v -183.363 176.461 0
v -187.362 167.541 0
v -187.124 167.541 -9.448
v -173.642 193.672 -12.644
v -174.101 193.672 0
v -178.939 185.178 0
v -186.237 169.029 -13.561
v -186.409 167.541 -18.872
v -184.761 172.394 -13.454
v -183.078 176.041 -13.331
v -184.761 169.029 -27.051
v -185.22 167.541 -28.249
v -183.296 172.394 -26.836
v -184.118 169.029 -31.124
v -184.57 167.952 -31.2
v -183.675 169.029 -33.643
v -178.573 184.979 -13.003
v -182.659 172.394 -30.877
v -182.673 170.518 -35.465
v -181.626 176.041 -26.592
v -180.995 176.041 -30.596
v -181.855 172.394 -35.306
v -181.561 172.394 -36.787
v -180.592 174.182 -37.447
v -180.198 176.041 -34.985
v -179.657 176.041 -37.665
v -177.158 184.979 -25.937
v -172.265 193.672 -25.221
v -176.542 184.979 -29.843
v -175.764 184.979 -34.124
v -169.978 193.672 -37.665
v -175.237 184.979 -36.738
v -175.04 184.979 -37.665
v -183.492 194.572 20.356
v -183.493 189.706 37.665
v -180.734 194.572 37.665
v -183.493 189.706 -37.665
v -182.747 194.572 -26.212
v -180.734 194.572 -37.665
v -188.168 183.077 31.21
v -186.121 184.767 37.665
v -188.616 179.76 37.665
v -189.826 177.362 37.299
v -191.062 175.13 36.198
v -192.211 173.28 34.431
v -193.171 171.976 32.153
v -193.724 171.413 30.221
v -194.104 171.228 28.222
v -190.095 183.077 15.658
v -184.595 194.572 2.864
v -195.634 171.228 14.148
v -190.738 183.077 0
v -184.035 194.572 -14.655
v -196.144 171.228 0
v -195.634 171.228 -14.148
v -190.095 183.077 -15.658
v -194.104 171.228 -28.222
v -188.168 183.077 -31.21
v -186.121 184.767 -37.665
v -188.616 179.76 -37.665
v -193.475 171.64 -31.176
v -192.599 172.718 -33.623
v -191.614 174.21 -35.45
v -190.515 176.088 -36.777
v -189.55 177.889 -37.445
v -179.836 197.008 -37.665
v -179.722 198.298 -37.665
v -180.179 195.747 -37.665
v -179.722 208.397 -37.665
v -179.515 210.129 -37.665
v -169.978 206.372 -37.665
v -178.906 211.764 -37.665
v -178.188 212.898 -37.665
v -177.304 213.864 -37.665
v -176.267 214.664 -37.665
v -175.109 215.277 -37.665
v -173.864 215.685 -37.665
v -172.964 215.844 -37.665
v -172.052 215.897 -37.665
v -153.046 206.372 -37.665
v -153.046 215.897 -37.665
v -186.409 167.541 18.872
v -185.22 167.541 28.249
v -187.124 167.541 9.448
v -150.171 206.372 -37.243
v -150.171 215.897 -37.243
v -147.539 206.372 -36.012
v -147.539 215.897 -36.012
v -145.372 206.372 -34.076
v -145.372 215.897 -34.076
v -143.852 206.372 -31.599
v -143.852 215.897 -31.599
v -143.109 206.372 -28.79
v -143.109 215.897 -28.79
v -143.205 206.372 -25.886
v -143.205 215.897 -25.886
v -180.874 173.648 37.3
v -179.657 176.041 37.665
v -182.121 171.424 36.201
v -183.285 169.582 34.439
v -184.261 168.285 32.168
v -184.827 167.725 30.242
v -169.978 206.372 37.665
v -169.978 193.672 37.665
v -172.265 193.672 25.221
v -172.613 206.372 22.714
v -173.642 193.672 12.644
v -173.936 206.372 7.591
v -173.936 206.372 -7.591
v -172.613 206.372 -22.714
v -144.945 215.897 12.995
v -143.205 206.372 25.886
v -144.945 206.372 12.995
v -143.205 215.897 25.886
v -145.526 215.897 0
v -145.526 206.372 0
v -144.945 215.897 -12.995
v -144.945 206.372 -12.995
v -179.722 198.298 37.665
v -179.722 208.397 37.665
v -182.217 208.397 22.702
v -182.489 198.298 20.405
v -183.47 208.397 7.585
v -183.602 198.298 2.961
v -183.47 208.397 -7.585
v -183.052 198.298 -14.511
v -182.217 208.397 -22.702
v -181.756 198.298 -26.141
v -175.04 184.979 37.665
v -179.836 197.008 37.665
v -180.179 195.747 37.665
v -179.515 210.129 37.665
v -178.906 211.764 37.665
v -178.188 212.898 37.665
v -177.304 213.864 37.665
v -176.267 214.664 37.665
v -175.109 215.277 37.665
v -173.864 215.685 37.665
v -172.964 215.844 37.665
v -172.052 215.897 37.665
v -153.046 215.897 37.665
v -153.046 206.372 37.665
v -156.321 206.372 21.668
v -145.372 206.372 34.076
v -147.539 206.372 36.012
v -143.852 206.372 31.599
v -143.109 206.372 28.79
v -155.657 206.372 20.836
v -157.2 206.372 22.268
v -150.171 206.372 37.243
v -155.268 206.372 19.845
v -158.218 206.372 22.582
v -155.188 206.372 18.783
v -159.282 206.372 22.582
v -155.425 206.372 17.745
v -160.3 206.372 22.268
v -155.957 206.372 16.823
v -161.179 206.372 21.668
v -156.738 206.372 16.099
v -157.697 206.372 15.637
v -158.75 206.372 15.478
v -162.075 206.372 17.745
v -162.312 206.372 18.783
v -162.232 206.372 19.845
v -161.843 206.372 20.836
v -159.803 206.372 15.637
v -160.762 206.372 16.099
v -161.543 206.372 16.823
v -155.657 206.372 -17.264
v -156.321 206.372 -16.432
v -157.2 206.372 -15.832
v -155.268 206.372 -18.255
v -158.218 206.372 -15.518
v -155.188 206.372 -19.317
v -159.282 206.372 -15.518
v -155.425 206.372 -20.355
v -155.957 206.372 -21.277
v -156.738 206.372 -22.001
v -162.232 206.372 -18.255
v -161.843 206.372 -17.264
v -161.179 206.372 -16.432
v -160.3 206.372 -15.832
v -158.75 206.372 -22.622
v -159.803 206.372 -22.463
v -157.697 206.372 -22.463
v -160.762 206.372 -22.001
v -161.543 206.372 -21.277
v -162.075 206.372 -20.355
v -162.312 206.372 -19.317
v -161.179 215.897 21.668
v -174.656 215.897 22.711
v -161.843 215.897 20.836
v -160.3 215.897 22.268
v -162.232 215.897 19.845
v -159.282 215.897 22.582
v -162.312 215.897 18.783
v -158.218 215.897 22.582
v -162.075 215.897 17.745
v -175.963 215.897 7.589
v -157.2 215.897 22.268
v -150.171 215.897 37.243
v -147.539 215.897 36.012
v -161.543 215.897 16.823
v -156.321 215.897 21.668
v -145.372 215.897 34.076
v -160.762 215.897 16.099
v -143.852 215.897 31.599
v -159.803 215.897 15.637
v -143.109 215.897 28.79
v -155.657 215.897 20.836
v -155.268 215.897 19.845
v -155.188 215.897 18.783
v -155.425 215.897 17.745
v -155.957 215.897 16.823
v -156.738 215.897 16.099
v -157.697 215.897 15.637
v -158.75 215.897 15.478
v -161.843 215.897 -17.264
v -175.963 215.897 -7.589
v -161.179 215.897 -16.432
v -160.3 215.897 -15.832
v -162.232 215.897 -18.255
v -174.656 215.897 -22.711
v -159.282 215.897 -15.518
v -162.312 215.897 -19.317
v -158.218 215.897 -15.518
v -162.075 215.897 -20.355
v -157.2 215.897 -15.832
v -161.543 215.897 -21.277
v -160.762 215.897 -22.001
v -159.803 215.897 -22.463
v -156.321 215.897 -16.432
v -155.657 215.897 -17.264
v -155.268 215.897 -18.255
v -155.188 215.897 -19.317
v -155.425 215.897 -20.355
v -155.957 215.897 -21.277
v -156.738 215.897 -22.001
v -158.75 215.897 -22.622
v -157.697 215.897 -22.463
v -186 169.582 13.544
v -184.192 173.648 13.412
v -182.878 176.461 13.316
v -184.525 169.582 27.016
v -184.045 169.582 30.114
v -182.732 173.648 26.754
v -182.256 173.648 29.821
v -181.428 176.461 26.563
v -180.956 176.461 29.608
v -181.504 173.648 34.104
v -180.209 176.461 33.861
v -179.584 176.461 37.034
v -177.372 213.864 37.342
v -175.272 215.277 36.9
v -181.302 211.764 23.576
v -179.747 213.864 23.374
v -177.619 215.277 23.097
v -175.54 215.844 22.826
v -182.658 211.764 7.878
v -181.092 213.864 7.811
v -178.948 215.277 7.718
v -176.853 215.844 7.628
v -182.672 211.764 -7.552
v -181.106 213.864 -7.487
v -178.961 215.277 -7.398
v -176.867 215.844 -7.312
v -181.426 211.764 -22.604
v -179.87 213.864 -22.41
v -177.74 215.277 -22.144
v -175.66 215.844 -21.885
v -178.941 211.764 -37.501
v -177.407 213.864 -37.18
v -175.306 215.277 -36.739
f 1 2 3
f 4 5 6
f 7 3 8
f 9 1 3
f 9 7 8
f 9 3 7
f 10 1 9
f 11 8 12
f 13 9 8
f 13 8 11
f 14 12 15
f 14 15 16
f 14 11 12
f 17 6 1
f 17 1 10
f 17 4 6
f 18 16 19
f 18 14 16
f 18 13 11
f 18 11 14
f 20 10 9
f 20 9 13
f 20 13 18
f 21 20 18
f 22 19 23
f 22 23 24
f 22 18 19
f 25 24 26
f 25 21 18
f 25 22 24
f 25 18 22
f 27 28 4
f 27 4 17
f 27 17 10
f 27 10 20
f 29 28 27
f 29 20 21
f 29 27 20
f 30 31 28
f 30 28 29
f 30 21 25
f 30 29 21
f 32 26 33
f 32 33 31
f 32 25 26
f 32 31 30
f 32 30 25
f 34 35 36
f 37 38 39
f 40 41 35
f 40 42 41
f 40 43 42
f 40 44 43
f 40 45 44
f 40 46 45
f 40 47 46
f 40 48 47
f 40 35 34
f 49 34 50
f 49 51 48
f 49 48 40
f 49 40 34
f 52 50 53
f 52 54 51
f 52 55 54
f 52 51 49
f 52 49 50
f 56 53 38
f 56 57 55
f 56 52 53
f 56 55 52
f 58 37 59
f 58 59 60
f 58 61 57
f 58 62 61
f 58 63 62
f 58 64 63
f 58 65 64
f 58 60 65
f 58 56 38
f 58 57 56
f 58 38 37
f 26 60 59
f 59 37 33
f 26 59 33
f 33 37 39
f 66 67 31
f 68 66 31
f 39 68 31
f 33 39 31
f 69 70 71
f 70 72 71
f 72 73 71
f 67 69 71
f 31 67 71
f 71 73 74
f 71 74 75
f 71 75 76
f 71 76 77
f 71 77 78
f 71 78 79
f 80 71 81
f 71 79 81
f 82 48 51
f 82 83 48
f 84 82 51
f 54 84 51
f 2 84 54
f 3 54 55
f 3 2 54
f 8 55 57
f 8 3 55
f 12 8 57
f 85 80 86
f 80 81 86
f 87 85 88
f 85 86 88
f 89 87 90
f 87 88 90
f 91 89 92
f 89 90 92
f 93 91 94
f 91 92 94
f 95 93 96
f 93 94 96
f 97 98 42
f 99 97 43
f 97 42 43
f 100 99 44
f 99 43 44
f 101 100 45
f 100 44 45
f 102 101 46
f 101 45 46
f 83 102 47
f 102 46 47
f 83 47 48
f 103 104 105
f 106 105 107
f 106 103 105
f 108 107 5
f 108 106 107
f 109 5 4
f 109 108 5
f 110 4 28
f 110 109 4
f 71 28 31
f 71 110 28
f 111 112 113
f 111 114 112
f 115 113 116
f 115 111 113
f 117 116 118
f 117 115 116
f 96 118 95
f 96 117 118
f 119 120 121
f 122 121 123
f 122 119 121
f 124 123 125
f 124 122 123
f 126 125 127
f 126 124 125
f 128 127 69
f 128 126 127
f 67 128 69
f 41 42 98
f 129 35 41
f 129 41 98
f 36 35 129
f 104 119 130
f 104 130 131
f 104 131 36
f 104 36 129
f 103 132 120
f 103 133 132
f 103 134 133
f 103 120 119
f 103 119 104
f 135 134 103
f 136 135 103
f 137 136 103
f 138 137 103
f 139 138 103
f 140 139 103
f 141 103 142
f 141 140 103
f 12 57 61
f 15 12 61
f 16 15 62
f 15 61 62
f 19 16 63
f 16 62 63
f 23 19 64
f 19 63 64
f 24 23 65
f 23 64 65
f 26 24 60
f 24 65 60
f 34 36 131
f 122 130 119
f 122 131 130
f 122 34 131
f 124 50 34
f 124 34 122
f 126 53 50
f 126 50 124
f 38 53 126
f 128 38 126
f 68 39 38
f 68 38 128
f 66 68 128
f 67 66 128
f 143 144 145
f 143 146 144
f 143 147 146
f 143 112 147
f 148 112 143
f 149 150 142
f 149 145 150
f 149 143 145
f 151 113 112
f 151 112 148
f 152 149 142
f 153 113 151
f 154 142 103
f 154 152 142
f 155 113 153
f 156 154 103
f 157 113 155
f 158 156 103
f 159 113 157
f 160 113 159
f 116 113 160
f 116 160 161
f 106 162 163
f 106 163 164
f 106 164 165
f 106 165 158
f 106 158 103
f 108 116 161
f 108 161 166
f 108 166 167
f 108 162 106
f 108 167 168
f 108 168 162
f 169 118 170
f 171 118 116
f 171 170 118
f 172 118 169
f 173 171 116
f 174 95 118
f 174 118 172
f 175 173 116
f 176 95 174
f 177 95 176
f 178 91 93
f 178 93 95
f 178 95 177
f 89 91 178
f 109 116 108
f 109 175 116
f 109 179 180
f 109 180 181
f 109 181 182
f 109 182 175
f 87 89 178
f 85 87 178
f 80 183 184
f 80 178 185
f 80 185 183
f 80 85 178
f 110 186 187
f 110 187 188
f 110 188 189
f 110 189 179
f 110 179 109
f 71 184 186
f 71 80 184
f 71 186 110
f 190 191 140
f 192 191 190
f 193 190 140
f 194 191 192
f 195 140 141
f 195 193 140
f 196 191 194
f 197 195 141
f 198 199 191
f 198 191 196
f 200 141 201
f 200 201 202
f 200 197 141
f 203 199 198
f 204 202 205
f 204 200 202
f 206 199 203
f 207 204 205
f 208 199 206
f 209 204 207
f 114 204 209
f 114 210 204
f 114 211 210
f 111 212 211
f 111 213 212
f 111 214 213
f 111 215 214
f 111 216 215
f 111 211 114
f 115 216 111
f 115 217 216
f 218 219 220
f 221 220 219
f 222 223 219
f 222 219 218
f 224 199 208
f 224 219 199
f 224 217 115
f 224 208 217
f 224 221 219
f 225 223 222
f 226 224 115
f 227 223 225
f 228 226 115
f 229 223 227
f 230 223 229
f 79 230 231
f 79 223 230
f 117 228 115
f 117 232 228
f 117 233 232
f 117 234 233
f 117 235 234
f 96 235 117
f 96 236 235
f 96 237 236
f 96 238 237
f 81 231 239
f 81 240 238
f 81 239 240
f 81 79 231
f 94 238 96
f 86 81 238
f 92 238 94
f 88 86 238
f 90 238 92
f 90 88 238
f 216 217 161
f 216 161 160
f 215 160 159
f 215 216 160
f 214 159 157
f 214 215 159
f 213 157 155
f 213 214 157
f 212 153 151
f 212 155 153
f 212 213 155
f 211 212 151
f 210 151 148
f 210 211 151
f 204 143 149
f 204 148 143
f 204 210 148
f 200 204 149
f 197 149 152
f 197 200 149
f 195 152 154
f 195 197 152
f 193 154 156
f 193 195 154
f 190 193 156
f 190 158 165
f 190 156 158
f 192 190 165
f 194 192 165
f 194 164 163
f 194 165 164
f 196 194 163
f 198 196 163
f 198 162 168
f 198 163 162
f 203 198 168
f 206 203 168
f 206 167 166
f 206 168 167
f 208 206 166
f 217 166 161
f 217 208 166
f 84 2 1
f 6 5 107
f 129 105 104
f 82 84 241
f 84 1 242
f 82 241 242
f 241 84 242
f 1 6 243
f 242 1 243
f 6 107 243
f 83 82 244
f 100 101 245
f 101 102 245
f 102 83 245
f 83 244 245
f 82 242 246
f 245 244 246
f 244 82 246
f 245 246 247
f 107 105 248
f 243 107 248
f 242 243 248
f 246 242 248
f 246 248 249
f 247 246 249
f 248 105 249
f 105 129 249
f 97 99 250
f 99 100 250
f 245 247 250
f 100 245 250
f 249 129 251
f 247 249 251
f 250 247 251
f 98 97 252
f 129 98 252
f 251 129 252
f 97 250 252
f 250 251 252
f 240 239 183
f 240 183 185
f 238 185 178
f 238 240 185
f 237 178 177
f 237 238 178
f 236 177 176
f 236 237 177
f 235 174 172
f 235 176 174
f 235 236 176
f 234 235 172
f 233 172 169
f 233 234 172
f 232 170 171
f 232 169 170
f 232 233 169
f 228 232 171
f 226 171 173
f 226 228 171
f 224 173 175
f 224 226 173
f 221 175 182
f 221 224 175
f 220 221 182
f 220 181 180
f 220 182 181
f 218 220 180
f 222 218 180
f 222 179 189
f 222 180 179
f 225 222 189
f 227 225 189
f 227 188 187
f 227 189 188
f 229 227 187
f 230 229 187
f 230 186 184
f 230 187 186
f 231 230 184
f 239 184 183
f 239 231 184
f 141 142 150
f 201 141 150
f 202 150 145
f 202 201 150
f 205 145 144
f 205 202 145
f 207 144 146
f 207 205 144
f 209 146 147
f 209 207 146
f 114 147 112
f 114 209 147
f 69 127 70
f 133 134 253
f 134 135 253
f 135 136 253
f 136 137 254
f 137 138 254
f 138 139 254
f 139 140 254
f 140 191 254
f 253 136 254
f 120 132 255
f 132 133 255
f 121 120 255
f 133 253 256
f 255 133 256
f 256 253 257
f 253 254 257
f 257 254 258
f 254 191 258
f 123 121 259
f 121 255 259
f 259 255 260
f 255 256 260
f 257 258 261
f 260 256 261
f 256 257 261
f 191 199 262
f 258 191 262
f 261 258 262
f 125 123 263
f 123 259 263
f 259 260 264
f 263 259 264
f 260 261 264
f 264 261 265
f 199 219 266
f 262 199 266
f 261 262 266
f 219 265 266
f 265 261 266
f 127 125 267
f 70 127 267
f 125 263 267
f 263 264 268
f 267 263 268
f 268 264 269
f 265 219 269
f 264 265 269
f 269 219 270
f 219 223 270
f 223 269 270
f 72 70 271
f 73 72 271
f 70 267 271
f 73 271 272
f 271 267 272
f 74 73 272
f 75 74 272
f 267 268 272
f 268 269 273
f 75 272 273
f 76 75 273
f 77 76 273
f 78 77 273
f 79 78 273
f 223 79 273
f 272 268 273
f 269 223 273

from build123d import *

# Parameters (mm, degrees)
REVOLVE1_ANGLE          = 30
FILLET1_R               = 7.5
CUT_EXTRUDE1_DEPTH      = 207.295163461
CUT_EXTRUDE1_DEPTH_BACK = 207.295163461
SKETCH3_R               = 3.571875
SKETCH4_OUTSIDE_W       = 82.664
SKETCH4_OUTSIDE_H       = 128.62
SKETCH4_OUTSIDE_W_2     = 74.859969382
SKETCH4_OUTSIDE_H_2     = 75.329921726
CUT_EXTRUDE2_DEPTH      = 209.298230862
FILLET2_R               = 10


with BuildPart() as part:
    # Sketch2 → Revolve1 (revolve, symmetric)
    with BuildSketch(Plane.XY) as revolve1_sk:
        with BuildLine():
            Line((-196.144484664, 171.227986779), (-187.361895799, 167.541286653))
            ThreePointArc((-187.361895799, 167.541286653), (-181.203221282, 180.846197706), (-174.101233777, 193.672409282))
            Line((-174.101233777, 193.672409282), (-174.101233777, 206.372409282))
            Line((-174.101233777, 206.372409282), (-145.526233777, 206.372409282))
            Line((-145.526233777, 206.372409282), (-145.526233777, 215.897409282))
            Line((-145.526233777, 215.897409282), (-183.626233777, 215.897409282))
            Line((-183.626233777, 215.897409282), (-183.626233777, 196.285035224))
            ThreePointArc((-183.626233777, 196.285035224), (-190.298222707, 183.962773472), (-196.144484664, 171.227986779))
        make_face()
    revolve(axis=Axis((0, 0, 0), (0, 1, 0)), revolution_arc=REVOLVE1_ANGLE / 2)
    revolve(revolve1_sk.sketch, axis=Axis((0, 0, 0), (0, -1, 0)), revolution_arc=REVOLVE1_ANGLE / 2)

    # Fillet1
    fillet1_edges = [part.edges().sort_by_distance(p)[0] for p in [
        (-183.626233777, 196.285035224, 0),
        (-183.626233777, 215.897409282, 0),
    ]]
    fillet(fillet1_edges, radius=FILLET1_R)

    # Sketch3 → Cut-Extrude1 (cut, two sides: drawn at the far end of the back side and taken through both)
    with BuildSketch(Plane.XZ.offset(-206.372409282).offset(-CUT_EXTRUDE1_DEPTH_BACK)):
        with Locations(Location((-158.75, 19.05, 0), (0, 0, 270))):
            Circle(SKETCH3_R)
        with Locations(Location((-158.75, -19.05, 0), (0, 0, 270))):
            Circle(SKETCH3_R)
    extrude(amount=CUT_EXTRUDE1_DEPTH + CUT_EXTRUDE1_DEPTH_BACK, mode=Mode.SUBTRACT)

    # Sketch4 outside → Cut-Extrude2 (cut, through all)
    with BuildSketch(Plane(origin=(0, 215.897409282, 0), x_dir=(1, 0, 0), z_dir=(0, 1, 0))):
        with Locations((-168.356, 0)):
            Rectangle(SKETCH4_OUTSIDE_W, SKETCH4_OUTSIDE_H)
        with Locations((-177.997532298, 0)):
            Rectangle(SKETCH4_OUTSIDE_W_2, SKETCH4_OUTSIDE_H_2, mode=Mode.SUBTRACT)
    extrude(amount=-CUT_EXTRUDE2_DEPTH, mode=Mode.SUBTRACT)

    # Fillet2
    fillet2_edges = [part.edges().sort_by_distance(p)[0] for p in [
        (-140.567547607, 211.134909282, 37.664960863),
        (-188.015889107, 169.383911967, 37.664960863),
        (-188.015889107, 169.383911967, -37.664960863),
        (-140.567547607, 211.134909282, -37.664960863),
    ]]
    fillet(fillet2_edges, radius=FILLET2_R)


solid = part.part
